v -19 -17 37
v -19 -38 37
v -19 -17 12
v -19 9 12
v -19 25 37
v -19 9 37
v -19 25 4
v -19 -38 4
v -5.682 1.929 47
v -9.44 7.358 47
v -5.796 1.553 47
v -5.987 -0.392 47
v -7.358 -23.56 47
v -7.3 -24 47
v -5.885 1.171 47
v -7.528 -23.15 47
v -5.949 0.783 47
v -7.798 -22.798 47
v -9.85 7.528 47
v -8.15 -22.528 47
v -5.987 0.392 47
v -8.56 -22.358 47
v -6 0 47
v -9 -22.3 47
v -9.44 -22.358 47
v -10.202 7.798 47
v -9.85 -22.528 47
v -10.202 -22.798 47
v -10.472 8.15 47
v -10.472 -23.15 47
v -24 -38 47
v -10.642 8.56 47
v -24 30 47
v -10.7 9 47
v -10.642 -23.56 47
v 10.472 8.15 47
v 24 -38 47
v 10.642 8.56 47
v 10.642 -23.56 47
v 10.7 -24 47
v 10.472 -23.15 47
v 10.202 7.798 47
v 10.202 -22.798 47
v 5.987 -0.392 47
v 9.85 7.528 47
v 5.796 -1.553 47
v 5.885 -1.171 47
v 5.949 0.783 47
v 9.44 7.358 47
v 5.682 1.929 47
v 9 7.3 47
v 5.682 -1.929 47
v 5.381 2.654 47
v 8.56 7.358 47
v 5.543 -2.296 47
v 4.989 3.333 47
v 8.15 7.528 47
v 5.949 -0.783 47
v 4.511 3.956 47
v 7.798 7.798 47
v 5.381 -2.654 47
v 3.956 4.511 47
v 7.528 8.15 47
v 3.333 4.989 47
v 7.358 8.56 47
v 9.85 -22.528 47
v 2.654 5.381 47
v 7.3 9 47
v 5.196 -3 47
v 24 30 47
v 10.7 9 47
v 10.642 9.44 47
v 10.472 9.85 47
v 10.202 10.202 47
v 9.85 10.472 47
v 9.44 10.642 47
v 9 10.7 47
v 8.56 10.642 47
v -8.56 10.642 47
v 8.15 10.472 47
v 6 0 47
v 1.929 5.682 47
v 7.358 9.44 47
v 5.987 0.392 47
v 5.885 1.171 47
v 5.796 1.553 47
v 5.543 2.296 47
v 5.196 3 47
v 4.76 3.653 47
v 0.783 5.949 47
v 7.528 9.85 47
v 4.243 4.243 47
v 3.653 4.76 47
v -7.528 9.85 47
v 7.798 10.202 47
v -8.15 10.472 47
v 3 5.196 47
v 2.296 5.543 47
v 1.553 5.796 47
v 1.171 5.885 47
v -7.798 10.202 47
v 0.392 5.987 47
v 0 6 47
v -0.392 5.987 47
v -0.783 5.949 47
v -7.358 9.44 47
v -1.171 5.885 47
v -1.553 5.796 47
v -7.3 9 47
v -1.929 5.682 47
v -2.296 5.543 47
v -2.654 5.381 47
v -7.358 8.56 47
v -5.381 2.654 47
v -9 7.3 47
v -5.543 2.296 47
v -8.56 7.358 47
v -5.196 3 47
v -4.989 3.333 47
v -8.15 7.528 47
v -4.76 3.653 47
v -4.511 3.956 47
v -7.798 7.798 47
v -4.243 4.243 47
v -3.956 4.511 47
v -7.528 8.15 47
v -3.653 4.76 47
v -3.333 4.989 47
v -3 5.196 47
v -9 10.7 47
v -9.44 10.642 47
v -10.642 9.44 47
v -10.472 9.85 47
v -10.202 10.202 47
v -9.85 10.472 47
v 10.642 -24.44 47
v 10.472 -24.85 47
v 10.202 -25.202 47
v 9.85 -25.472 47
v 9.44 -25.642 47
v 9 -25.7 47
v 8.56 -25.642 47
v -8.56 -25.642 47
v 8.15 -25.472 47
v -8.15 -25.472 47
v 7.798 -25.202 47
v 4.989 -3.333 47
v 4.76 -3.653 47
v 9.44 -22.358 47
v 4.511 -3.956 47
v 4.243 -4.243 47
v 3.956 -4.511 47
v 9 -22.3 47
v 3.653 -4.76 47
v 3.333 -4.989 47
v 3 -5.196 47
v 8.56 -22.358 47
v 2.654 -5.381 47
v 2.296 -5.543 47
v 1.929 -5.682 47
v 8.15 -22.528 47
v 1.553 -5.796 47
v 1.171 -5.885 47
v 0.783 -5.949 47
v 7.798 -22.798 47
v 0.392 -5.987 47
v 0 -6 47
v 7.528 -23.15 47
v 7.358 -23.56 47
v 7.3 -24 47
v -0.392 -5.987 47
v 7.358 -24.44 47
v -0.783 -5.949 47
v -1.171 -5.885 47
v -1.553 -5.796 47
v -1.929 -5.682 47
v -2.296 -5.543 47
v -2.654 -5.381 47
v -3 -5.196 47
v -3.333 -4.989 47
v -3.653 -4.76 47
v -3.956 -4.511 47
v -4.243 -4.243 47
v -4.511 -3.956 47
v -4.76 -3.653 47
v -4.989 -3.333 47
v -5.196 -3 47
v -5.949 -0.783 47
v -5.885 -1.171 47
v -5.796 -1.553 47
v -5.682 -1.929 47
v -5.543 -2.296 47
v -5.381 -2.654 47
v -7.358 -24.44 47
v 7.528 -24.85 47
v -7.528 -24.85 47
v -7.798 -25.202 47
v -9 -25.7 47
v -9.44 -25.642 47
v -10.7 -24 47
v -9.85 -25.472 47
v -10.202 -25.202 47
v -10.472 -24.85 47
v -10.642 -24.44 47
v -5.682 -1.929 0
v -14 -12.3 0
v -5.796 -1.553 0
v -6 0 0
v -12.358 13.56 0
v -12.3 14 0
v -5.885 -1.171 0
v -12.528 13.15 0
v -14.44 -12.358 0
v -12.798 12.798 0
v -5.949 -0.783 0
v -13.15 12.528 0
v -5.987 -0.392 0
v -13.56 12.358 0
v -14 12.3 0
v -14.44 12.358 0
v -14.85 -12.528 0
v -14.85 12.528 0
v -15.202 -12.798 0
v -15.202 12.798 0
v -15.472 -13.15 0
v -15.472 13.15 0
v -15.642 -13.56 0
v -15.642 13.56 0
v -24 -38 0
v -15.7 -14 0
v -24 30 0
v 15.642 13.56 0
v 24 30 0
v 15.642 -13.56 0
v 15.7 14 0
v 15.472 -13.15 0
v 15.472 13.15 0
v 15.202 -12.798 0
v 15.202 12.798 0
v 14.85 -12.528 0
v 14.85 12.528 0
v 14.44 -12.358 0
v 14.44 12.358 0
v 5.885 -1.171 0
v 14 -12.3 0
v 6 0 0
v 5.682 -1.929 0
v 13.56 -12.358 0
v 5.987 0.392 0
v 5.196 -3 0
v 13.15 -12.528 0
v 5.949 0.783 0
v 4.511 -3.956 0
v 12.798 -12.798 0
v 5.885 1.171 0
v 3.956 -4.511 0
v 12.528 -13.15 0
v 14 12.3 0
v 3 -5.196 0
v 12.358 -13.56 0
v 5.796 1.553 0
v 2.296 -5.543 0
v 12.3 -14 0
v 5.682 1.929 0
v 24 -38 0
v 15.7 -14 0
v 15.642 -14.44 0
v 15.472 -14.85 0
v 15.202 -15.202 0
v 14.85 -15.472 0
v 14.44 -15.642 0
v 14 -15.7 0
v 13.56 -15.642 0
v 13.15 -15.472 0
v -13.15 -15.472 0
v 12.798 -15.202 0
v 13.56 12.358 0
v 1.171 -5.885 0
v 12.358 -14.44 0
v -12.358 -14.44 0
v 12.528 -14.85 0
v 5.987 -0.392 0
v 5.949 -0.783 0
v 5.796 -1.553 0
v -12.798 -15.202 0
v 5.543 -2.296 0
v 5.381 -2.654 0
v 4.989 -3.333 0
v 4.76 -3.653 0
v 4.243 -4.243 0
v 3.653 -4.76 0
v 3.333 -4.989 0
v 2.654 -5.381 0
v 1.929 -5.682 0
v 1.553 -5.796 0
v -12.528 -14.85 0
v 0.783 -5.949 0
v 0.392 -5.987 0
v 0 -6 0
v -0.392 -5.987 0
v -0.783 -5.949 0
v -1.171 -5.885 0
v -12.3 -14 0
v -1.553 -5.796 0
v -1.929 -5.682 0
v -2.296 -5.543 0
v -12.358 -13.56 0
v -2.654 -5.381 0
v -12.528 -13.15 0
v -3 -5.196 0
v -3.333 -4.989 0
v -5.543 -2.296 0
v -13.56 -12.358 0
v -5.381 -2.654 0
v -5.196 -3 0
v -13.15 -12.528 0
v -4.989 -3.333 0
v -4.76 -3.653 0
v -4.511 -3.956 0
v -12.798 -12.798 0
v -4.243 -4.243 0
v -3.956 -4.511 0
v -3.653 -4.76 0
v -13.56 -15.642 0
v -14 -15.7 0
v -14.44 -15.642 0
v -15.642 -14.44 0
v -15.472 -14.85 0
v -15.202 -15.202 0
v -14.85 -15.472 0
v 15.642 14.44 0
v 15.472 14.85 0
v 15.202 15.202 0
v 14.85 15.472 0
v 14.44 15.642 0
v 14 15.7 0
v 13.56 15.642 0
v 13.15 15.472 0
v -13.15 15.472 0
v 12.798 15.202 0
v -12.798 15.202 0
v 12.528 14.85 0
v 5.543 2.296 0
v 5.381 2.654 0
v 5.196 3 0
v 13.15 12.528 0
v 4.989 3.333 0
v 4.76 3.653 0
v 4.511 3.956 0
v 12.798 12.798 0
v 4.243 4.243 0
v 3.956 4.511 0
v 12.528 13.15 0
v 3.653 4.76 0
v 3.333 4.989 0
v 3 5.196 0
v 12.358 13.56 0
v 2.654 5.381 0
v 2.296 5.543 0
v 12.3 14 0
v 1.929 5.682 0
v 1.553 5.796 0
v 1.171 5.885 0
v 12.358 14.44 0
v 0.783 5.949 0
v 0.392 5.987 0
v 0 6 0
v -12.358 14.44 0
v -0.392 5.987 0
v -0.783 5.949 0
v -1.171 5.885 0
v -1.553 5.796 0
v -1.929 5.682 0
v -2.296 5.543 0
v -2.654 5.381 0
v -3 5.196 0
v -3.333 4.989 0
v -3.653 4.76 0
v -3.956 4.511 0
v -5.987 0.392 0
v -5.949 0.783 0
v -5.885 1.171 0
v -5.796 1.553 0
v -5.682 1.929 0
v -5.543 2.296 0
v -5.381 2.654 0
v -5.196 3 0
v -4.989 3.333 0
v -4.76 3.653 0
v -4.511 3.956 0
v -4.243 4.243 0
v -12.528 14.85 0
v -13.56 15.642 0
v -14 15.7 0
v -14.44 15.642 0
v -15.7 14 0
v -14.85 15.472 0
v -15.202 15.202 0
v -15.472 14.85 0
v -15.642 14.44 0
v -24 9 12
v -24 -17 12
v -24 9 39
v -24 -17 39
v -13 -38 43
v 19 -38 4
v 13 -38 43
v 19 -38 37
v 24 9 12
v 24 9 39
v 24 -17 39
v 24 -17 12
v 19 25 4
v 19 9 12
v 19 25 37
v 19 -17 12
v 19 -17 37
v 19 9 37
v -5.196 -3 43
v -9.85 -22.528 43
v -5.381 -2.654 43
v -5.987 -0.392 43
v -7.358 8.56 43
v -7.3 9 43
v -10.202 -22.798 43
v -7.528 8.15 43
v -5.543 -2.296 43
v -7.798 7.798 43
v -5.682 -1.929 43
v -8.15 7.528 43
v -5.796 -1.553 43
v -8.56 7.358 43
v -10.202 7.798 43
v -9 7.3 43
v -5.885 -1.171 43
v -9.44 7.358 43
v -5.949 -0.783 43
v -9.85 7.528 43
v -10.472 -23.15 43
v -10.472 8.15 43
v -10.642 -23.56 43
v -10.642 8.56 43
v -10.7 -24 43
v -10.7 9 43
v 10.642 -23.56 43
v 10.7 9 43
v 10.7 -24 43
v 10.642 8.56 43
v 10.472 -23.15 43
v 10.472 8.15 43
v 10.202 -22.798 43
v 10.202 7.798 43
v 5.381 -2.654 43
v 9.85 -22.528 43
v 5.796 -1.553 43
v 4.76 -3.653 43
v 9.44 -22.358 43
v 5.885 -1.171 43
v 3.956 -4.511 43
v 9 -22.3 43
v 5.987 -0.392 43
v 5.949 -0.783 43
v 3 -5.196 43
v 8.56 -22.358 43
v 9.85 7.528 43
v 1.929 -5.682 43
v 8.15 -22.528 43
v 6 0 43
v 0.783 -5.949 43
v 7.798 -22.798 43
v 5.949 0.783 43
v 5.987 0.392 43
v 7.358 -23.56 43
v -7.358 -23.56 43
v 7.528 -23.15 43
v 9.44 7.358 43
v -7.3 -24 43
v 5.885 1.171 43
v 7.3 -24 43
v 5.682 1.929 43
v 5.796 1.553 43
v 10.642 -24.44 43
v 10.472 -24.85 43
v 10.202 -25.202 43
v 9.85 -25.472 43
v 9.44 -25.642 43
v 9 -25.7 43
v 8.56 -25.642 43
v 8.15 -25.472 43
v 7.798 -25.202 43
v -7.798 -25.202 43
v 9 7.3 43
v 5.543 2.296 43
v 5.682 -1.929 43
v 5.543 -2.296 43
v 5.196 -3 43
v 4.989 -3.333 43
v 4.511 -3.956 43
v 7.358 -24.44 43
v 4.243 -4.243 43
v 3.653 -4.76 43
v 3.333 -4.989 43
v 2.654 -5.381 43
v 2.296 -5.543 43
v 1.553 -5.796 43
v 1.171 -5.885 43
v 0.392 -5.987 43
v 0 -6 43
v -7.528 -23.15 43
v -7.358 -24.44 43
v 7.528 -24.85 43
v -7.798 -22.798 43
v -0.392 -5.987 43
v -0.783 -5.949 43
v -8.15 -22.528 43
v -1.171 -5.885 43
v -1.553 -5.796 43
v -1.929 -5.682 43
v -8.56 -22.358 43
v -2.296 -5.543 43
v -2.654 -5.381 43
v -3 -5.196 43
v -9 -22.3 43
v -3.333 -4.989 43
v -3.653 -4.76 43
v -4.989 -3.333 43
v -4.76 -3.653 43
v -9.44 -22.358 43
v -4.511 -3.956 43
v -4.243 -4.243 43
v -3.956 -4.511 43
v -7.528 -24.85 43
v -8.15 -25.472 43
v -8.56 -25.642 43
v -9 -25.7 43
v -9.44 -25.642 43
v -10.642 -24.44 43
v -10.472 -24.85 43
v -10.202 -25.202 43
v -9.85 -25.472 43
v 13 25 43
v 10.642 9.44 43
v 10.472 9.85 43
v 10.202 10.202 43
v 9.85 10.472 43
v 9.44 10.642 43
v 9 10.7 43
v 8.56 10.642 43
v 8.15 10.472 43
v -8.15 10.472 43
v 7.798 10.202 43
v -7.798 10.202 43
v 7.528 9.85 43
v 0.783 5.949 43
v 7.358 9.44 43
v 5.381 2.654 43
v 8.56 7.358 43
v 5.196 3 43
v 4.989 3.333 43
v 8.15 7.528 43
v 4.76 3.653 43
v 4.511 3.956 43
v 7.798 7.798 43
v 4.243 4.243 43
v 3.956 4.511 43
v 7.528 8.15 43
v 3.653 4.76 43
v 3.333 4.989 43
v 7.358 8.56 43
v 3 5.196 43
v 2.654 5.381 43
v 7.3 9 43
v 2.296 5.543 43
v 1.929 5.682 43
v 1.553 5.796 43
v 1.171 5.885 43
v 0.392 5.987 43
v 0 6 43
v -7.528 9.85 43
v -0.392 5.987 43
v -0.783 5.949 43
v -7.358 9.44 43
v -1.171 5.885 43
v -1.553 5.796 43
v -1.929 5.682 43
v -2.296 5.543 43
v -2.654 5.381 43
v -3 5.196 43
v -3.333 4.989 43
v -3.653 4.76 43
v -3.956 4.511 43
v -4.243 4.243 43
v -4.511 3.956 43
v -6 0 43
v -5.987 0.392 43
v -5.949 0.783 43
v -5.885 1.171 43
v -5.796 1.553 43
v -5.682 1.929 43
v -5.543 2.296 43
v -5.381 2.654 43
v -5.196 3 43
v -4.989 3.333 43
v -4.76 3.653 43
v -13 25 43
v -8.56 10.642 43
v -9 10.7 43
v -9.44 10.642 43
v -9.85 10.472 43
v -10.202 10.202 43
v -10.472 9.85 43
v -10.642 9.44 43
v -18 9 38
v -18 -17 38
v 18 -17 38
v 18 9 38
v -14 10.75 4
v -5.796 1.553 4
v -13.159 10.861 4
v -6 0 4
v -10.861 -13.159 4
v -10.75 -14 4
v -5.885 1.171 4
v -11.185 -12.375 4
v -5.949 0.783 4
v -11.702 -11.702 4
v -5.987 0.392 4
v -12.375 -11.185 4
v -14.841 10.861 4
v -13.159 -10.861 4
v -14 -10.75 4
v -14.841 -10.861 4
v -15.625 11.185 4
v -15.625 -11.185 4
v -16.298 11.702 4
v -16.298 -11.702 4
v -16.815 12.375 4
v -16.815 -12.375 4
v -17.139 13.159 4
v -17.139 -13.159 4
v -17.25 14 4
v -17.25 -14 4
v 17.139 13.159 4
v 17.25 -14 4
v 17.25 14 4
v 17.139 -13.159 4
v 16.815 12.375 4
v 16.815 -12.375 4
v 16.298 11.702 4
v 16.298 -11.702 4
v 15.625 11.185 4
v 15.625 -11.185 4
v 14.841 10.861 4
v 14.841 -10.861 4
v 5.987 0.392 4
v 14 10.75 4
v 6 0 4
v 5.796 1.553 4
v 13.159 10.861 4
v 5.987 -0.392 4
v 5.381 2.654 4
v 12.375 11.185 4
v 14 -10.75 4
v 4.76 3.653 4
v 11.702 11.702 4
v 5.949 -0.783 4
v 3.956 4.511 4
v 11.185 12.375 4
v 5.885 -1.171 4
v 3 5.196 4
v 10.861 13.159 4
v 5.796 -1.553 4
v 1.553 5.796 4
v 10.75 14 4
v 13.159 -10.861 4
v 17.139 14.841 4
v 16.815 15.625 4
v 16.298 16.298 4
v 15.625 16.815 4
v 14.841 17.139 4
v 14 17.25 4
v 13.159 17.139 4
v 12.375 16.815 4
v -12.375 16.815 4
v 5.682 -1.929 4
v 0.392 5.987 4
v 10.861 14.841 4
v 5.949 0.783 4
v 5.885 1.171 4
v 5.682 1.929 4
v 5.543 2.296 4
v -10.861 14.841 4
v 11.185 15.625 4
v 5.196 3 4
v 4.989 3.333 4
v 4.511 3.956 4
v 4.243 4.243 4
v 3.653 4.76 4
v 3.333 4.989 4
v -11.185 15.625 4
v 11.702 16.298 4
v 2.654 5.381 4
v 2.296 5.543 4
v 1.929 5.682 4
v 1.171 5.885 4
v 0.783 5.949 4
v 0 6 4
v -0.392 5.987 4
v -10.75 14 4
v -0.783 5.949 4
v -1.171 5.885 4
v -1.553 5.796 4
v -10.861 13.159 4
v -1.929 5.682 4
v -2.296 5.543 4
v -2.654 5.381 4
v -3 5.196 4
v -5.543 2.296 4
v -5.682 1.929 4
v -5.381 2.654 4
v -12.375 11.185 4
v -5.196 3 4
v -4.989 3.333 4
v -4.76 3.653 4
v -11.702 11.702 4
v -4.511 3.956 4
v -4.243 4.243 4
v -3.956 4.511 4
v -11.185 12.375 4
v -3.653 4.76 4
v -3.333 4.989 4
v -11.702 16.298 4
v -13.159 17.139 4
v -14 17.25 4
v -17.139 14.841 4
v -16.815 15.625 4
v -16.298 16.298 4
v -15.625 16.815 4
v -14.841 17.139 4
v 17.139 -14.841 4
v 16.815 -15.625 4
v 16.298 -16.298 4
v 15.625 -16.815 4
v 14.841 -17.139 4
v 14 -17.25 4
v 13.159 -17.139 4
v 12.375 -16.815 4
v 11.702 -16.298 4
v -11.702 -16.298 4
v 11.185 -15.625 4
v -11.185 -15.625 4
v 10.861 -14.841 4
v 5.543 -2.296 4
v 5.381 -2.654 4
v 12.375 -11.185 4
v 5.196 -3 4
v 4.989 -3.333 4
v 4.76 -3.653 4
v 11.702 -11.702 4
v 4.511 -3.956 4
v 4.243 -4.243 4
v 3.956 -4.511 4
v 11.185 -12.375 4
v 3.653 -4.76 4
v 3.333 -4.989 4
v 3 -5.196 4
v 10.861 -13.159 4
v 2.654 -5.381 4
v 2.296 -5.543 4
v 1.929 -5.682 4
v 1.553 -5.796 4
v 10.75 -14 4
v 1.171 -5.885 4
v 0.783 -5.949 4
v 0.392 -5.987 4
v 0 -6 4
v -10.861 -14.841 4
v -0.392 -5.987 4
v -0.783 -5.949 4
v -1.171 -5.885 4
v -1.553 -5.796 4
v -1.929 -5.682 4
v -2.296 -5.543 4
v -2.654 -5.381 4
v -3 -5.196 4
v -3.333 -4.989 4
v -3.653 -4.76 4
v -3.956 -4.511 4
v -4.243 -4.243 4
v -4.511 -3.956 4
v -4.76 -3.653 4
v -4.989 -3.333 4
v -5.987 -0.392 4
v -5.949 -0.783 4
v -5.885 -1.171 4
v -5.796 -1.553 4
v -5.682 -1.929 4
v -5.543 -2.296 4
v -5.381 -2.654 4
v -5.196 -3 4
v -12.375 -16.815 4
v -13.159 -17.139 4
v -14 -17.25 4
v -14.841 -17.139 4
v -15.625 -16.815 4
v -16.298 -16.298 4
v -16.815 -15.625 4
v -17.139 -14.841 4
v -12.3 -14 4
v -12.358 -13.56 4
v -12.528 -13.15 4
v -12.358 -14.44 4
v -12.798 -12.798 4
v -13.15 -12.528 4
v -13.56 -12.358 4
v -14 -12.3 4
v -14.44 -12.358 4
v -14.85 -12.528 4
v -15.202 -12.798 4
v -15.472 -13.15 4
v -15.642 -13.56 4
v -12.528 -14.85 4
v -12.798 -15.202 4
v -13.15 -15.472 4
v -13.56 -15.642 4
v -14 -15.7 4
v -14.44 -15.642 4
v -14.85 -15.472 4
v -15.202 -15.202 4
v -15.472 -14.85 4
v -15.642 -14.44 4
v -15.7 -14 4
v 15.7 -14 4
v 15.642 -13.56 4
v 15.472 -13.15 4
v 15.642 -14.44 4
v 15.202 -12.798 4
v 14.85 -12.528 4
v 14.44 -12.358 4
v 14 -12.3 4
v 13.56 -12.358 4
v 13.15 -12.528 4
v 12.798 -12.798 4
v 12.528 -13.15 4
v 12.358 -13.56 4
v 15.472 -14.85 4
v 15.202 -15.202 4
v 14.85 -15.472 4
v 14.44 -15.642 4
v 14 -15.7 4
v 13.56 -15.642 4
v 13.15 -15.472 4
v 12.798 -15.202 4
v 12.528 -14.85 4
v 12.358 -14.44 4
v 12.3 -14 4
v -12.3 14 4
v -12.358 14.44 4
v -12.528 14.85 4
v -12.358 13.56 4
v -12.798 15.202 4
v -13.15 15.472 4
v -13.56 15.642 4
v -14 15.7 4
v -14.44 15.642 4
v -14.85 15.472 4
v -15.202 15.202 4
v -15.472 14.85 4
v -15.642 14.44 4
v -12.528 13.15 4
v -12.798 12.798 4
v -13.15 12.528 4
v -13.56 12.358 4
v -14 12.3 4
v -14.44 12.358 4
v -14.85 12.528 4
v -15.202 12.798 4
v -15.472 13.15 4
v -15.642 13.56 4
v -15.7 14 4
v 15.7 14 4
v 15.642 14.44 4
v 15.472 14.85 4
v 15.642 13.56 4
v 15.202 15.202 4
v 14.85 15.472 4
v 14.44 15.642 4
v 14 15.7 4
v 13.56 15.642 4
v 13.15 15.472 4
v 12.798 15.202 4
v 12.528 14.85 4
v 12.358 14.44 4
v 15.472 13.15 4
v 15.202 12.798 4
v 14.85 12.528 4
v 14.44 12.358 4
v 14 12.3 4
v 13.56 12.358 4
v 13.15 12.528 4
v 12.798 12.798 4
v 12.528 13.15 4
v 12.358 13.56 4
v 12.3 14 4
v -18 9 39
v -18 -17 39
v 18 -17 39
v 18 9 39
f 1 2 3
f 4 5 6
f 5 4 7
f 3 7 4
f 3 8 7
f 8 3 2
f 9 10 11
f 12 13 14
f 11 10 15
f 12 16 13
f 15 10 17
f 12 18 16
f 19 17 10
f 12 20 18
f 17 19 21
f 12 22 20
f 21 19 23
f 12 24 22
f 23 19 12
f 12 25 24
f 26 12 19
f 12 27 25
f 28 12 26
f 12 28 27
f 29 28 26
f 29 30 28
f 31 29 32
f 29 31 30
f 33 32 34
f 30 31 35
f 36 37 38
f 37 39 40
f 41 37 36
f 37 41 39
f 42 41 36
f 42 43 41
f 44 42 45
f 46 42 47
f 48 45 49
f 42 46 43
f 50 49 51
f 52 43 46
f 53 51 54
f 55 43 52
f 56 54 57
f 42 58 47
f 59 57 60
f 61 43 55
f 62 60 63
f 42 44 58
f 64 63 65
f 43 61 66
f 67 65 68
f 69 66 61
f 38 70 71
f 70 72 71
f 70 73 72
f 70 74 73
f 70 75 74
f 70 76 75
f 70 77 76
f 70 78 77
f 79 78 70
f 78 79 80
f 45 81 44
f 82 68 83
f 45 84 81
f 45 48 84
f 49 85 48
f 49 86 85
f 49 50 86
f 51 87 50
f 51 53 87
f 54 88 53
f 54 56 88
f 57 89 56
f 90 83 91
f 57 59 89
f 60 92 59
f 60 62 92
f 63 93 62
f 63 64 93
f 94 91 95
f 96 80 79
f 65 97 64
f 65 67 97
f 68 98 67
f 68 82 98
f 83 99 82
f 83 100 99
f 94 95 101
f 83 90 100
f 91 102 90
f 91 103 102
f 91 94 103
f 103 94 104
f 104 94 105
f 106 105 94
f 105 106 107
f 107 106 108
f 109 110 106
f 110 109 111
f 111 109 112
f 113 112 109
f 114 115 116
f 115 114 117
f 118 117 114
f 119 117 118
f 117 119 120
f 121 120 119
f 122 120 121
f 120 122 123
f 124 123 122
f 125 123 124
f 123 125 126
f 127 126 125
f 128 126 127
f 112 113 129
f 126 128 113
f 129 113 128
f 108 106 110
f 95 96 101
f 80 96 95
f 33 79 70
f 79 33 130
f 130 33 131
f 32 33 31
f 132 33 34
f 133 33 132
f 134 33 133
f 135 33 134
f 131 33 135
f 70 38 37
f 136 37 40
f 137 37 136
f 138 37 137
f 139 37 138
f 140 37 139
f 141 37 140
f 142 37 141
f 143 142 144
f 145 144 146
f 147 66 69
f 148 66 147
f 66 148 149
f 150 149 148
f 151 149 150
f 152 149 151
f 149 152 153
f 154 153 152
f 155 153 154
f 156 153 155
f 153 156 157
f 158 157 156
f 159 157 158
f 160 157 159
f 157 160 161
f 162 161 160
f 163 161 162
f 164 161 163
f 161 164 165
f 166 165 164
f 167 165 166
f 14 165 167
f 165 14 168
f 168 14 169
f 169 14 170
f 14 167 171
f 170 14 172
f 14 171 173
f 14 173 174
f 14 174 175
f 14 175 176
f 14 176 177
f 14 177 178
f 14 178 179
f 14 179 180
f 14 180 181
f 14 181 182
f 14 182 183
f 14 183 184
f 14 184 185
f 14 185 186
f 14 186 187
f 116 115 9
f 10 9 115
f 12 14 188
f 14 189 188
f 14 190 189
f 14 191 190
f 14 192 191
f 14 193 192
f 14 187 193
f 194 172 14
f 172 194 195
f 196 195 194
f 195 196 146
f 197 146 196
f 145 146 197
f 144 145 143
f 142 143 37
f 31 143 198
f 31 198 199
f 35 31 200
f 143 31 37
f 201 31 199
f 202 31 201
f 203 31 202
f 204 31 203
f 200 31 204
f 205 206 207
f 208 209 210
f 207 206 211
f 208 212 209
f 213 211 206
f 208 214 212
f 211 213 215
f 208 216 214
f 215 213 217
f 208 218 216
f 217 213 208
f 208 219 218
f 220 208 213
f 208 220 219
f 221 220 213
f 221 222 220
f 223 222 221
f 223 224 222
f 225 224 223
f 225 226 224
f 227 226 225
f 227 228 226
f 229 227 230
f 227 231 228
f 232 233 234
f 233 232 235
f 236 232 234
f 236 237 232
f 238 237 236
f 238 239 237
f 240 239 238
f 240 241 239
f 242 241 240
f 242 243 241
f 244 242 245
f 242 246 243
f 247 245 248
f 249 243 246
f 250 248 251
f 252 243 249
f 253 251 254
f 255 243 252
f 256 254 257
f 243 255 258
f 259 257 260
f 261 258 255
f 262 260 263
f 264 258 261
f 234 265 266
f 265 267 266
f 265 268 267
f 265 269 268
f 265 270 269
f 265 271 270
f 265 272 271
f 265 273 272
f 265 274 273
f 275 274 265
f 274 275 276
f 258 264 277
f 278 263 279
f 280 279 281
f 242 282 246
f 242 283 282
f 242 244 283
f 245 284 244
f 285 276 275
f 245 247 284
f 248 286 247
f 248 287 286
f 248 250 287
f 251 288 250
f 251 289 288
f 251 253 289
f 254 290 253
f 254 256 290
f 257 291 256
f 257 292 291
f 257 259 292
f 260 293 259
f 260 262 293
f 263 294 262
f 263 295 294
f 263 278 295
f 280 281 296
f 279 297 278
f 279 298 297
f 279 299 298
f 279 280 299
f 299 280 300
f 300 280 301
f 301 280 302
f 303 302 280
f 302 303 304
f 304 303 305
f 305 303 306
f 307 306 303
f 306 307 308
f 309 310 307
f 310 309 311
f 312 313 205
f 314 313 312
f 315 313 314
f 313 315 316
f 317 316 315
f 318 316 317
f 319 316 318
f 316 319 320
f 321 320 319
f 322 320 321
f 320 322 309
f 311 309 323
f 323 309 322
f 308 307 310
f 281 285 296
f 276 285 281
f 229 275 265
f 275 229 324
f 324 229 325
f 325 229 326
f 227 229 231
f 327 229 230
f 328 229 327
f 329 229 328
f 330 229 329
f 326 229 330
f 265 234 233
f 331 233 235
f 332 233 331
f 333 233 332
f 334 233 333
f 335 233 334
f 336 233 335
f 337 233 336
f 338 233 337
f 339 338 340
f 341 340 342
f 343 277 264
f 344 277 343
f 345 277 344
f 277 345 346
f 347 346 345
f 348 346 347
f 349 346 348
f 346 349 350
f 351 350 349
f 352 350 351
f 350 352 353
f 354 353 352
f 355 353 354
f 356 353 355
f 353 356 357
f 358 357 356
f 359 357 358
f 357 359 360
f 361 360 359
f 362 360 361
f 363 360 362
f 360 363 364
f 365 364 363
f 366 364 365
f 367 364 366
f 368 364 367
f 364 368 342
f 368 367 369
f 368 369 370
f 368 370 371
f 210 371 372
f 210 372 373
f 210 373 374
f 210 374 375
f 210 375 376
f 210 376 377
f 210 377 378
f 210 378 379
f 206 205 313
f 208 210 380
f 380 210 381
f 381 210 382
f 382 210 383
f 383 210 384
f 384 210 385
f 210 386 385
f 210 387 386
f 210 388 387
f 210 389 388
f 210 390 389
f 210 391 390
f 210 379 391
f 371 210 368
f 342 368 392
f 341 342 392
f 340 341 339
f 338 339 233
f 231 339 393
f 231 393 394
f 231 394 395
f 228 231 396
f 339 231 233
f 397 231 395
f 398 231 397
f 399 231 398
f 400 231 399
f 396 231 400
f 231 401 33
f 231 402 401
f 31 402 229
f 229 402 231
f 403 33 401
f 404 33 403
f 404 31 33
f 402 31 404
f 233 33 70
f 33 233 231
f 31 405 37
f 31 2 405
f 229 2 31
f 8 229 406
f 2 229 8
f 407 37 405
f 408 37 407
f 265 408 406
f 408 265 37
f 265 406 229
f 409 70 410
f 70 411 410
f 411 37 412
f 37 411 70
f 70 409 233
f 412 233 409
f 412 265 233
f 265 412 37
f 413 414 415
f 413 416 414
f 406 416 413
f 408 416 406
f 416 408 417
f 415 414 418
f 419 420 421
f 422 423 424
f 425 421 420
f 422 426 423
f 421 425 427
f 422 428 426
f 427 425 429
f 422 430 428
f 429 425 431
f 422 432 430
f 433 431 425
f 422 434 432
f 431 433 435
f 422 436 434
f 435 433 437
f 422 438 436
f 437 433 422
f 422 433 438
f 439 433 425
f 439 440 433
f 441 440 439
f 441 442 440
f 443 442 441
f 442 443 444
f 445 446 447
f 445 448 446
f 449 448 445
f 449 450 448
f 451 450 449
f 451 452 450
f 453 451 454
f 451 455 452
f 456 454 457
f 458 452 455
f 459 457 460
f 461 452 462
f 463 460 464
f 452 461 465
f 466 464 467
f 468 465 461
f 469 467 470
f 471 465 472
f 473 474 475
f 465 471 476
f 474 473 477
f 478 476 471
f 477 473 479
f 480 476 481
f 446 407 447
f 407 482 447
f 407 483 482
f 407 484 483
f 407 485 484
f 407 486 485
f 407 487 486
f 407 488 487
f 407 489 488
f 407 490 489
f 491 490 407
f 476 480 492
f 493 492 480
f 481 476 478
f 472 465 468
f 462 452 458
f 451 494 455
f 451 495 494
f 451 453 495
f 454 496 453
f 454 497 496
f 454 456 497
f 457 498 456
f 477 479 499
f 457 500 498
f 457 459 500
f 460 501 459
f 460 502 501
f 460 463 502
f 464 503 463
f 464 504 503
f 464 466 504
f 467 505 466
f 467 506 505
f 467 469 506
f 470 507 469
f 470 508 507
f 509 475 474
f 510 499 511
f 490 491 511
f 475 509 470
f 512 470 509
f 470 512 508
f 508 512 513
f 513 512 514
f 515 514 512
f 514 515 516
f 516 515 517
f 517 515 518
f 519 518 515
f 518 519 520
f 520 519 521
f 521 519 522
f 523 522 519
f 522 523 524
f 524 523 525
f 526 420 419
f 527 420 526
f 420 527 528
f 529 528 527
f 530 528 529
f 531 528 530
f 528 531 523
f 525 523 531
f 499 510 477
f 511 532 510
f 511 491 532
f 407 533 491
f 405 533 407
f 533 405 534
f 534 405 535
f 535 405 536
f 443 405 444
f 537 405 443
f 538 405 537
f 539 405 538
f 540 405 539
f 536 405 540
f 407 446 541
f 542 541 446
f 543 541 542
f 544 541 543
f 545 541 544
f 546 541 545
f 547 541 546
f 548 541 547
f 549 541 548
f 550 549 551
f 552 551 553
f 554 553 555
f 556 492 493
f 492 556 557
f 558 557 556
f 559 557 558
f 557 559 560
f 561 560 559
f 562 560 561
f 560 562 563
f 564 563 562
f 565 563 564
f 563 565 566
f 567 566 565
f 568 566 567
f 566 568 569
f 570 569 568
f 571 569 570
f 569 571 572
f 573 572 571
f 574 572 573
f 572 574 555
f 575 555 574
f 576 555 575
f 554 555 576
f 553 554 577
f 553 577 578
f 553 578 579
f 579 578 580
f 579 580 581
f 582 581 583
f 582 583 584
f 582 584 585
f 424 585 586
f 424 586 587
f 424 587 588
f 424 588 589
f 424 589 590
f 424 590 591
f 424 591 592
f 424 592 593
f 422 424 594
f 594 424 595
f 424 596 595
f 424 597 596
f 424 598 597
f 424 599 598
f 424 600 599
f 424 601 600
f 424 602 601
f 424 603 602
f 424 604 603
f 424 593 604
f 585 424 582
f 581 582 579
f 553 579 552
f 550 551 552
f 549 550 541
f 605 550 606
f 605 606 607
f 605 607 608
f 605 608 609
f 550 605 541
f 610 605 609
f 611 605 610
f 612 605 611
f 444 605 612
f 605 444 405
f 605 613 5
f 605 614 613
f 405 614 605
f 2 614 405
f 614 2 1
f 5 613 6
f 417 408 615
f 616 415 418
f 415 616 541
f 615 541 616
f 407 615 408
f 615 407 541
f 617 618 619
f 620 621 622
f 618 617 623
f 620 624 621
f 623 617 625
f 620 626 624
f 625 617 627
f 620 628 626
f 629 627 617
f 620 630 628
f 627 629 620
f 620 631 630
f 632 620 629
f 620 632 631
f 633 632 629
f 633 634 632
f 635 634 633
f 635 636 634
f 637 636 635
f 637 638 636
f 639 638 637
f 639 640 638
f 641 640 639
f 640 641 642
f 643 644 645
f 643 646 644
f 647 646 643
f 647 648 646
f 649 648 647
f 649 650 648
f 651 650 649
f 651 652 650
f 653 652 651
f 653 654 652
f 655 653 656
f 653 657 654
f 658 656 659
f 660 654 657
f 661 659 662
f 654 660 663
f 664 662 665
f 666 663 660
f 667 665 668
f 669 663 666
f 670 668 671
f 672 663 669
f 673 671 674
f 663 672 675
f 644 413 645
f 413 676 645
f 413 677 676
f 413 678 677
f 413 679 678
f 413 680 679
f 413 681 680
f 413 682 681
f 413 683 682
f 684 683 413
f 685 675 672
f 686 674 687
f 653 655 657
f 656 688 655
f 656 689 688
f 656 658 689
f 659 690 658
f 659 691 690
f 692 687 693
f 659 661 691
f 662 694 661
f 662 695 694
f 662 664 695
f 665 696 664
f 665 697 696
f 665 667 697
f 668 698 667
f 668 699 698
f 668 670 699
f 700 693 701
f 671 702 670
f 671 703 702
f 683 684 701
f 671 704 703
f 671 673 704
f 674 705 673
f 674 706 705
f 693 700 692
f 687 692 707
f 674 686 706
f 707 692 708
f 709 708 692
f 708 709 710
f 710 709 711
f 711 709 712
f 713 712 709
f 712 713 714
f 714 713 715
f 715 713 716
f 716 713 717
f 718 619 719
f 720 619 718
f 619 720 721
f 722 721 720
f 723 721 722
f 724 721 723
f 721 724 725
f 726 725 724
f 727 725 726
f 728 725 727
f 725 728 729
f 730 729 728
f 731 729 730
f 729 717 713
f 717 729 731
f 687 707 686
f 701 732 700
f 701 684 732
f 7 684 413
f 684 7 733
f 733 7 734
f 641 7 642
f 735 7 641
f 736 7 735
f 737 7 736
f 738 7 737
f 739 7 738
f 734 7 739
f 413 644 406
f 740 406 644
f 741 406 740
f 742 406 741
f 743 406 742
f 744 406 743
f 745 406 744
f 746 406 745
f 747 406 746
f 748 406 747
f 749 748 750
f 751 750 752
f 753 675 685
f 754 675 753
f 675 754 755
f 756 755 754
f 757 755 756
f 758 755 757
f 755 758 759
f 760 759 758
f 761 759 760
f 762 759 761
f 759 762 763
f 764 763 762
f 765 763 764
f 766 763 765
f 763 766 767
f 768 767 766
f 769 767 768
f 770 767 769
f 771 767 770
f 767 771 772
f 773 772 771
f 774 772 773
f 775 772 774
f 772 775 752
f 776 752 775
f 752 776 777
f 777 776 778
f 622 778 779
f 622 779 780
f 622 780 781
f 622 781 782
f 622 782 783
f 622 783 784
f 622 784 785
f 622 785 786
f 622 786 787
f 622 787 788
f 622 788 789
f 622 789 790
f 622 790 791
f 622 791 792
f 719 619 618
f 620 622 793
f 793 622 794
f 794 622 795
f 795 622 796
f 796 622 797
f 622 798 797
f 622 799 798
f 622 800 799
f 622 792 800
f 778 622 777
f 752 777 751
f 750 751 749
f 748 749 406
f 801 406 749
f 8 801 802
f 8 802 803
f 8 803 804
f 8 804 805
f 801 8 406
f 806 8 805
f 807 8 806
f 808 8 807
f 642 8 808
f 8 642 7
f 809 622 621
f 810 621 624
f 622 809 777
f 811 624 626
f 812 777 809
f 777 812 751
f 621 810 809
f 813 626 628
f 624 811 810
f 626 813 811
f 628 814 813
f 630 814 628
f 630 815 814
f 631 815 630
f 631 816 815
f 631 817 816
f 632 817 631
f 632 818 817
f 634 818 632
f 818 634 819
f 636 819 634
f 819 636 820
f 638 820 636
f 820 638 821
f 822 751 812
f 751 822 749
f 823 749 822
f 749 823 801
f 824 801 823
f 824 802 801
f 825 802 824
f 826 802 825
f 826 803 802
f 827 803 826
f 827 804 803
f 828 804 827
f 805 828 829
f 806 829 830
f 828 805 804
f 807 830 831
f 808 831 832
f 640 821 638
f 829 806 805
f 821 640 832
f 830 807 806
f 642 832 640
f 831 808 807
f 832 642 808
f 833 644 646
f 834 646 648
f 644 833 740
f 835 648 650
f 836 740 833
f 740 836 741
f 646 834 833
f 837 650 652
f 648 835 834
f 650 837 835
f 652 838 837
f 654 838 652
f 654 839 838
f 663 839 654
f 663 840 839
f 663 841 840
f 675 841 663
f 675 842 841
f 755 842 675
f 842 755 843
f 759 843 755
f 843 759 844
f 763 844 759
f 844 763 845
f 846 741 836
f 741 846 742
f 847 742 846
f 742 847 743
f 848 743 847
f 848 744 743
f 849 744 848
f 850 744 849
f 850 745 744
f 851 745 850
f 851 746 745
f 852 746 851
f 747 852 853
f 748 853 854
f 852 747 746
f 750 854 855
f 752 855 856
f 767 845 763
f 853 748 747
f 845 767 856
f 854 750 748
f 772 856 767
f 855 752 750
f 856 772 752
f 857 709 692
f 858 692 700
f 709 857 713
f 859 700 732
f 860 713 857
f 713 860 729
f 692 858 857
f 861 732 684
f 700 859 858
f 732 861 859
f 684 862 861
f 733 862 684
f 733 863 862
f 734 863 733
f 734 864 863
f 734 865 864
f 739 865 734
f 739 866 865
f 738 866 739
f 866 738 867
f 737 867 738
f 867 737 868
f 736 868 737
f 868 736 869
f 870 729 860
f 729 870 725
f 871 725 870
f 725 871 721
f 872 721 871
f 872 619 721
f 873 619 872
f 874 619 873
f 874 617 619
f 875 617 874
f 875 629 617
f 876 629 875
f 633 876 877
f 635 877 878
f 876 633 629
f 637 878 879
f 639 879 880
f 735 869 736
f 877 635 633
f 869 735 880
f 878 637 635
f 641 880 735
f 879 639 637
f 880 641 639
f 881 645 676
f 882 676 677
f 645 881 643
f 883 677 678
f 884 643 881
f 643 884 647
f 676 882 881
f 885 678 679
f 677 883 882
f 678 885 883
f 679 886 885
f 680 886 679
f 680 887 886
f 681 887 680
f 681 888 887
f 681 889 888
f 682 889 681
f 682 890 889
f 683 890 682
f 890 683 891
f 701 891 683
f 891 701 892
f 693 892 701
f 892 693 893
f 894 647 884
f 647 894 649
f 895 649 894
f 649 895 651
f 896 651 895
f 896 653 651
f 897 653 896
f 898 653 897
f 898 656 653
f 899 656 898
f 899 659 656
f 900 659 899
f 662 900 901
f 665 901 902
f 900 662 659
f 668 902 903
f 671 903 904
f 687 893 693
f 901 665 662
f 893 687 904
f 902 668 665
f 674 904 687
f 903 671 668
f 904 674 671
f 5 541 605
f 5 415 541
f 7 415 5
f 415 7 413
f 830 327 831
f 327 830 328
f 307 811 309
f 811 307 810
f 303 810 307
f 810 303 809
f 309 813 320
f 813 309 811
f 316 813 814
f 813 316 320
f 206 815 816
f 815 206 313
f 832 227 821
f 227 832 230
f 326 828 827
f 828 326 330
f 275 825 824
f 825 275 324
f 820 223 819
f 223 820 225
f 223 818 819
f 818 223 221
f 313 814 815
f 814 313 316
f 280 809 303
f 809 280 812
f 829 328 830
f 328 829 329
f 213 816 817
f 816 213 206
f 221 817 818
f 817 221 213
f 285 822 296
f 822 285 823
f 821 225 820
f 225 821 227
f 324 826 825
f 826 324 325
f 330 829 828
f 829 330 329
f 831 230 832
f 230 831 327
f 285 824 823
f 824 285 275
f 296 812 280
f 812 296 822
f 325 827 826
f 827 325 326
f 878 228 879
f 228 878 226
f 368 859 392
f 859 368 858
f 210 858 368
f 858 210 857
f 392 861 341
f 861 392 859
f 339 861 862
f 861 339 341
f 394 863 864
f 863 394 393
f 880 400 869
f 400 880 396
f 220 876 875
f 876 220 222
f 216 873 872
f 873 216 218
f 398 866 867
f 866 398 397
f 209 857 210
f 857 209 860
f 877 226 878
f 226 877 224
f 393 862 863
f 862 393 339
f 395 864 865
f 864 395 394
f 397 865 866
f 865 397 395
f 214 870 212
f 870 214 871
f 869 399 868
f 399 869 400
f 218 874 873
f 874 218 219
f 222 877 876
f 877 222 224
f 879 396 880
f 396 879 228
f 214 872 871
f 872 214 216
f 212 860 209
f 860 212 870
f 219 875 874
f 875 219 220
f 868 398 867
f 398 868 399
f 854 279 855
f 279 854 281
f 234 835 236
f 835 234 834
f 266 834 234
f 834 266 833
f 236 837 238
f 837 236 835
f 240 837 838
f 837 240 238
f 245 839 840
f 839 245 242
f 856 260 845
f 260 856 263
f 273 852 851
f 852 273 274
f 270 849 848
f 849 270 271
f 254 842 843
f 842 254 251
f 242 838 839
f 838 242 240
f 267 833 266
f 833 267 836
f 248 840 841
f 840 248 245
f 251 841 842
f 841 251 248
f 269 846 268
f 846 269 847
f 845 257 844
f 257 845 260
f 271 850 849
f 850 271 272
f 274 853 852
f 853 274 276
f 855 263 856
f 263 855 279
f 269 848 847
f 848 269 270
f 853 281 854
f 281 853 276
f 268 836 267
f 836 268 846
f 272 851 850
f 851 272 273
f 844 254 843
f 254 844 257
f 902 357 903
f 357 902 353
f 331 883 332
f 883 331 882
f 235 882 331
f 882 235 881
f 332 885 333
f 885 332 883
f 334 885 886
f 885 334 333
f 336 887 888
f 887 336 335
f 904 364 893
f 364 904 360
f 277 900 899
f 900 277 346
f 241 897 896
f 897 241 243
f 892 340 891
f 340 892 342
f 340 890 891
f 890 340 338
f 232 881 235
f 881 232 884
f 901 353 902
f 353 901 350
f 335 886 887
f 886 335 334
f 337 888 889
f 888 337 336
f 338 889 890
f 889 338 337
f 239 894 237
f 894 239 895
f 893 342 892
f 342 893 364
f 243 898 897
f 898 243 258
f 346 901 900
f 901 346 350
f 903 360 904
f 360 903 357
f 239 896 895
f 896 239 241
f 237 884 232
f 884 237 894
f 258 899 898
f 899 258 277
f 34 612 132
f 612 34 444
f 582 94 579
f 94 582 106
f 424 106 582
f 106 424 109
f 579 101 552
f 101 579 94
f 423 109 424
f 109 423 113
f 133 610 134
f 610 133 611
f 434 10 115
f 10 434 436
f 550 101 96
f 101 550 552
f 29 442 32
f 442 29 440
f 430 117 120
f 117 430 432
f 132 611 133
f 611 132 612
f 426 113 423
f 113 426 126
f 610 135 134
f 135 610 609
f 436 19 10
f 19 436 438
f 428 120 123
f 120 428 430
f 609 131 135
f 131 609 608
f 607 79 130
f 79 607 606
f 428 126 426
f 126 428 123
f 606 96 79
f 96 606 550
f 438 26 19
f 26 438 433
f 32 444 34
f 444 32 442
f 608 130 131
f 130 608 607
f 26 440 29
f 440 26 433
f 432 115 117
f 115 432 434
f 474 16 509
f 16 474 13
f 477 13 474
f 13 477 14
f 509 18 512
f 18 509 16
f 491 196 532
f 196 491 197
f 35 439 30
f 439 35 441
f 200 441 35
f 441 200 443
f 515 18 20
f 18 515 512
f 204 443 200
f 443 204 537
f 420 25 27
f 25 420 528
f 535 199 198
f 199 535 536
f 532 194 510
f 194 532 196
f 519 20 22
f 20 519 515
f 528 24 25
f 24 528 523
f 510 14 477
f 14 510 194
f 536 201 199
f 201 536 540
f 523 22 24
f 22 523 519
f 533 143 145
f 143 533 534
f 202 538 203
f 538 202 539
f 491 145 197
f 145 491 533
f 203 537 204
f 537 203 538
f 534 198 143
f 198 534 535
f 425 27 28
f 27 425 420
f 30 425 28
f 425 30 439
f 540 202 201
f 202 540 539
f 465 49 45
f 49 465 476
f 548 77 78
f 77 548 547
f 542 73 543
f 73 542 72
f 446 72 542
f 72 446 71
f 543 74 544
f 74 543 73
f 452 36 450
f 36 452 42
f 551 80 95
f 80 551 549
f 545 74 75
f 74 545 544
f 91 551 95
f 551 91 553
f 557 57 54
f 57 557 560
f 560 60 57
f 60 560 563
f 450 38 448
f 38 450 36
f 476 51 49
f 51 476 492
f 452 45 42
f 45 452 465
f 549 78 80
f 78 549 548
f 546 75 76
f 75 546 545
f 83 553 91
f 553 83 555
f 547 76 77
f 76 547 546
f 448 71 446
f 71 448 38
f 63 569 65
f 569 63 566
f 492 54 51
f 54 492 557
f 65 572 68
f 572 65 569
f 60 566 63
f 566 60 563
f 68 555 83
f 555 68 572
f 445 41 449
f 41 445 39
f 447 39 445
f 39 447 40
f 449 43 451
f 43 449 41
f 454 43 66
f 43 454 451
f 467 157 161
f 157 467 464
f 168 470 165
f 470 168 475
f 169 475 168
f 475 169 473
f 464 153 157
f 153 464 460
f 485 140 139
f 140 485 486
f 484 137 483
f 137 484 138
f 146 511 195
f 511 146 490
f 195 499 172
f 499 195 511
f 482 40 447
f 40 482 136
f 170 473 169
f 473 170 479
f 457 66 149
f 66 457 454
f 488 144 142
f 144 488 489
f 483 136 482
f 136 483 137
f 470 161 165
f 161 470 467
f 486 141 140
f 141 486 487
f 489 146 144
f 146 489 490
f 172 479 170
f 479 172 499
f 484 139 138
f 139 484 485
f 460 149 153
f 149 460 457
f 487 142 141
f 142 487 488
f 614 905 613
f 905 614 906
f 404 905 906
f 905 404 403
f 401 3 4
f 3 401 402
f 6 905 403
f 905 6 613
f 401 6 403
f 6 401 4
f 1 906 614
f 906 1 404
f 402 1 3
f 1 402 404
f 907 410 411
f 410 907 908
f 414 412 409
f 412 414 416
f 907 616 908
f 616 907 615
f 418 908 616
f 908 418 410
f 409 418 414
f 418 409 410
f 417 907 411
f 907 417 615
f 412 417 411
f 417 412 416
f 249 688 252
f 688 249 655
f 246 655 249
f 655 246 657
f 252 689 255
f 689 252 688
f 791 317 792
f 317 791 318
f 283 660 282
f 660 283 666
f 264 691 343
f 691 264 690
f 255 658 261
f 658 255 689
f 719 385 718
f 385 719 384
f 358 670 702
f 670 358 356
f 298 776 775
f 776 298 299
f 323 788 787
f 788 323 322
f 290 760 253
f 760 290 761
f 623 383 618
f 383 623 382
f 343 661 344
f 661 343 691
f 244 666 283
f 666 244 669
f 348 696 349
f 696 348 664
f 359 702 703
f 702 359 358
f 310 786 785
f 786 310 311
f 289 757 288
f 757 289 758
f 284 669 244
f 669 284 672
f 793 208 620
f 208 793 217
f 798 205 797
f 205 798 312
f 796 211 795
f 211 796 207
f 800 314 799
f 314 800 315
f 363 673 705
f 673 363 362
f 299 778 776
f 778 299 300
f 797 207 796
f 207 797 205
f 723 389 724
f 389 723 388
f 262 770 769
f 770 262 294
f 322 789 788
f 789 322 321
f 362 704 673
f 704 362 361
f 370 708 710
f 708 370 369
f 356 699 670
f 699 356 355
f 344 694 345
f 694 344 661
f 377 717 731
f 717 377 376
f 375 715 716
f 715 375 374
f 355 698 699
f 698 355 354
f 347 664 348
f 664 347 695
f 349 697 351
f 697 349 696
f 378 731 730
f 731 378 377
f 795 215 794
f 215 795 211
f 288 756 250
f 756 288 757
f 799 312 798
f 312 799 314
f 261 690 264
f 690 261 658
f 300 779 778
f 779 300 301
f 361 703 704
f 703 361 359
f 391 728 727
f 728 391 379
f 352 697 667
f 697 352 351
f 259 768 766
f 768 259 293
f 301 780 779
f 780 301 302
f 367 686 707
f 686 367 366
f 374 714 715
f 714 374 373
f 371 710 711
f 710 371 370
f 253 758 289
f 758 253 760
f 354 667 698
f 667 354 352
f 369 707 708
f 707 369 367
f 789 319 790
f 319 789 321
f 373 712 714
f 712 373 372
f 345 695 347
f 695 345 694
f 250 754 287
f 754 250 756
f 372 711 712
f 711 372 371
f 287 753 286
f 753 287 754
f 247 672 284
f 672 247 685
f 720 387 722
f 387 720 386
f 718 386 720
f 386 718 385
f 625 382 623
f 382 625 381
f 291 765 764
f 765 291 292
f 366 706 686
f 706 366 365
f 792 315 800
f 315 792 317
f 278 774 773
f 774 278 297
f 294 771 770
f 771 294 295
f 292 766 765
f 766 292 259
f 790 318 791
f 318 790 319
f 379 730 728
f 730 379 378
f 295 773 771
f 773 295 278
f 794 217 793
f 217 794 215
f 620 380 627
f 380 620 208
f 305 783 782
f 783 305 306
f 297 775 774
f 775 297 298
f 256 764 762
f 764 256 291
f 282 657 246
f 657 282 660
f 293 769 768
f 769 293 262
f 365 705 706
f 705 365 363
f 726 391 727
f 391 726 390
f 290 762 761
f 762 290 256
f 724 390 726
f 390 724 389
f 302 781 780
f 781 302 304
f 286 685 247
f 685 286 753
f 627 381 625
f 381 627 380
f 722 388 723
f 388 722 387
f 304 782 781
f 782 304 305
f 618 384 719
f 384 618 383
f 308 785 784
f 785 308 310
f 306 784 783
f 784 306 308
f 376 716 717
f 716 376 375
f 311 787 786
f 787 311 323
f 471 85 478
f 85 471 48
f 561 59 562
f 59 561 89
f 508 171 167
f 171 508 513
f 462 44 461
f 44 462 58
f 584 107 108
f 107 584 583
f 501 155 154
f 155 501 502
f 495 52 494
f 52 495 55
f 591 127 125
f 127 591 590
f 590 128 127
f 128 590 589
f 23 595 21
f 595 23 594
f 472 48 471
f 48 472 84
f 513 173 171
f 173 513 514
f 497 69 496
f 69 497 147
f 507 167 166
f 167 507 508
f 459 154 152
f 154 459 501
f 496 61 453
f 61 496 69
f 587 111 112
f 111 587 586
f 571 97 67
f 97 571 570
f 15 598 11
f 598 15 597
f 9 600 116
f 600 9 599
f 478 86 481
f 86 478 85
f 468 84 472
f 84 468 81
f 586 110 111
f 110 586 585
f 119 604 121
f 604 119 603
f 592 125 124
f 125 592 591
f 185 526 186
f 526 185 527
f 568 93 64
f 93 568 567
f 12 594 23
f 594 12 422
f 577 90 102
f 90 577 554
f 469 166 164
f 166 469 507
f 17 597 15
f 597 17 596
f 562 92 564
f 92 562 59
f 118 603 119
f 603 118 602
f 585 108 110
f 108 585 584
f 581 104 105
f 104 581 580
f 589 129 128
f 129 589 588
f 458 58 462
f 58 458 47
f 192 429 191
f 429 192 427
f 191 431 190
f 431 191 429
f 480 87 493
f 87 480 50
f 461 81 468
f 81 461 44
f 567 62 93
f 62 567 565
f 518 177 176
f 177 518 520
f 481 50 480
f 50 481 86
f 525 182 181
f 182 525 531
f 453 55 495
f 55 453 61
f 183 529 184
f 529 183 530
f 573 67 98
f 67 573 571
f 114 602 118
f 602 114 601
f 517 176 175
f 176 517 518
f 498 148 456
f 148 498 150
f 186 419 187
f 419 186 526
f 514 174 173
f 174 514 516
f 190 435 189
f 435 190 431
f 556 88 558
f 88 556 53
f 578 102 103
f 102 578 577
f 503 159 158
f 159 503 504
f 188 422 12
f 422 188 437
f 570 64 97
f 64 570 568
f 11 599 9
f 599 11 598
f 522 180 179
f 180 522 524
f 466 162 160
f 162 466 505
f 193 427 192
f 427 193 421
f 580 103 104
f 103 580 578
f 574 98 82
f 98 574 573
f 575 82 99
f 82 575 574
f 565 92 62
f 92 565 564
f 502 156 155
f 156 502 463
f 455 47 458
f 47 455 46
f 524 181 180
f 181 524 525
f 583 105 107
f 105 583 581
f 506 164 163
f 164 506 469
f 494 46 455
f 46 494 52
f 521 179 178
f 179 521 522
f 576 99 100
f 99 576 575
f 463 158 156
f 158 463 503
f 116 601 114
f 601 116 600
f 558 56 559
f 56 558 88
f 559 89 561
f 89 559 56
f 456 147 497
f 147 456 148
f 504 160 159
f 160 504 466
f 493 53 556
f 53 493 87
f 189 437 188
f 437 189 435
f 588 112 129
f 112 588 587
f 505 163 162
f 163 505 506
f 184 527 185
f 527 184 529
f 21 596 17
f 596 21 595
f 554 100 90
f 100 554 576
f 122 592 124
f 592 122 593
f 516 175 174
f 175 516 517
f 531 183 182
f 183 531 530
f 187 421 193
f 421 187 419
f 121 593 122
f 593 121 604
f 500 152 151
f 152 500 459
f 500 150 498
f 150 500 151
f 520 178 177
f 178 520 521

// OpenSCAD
// ferris/motor_mount.scad (v7, 2026-09-03 — automatic rotation)
// Parts for the JGY-370 worm-gear motor drive that replaces the hand crank.
//   PART="bracket" : U-box bracket. Tower plate (4 x M3 into the tower-upper-motor
//                    pilots) + 2 side walls + top wall + motor flange (4 x M3 into
//                    the gearbox's threaded holes). Open at the bottom: the 370 can
//                    hangs down there and a hex key reaches the flange screws.
//                    The coupling lives inside the box -> pinch guard for free.
//   PART="coupler" : printed rigid coupler Ø8 (wheel shaft) <-> Ø6 D (motor),
//                    fallback for the aluminium flexible coupling.
//   PART="plate"   : 4 mm shim plate with the same pattern (fine-tune standoff).
// Coordinates (bracket): shaft axis = Z (print axis), z=0 = tower outer face.
//   X across the wheel, +Y = up (world Z). Motor can hangs toward -Y.

include <../params.scad>;

PART = "bracket";

zf = motor_standoff;                 // flange OUTER face (gearbox sits here)
inner_h = mb_top - mb_bottom;        // 58: box inner height (Y)

module box_shell() {
    // tower plate
    translate([-mb_outer_w/2, mb_bottom - mb_wall_t, 0])
        cube([mb_outer_w, inner_h + 2*mb_wall_t, mb_plate_t]);
    // side walls
    for (sx = [-1, 1])
        translate([sx > 0 ? mb_inner_w/2 : -mb_outer_w/2, mb_bottom - mb_wall_t, 0])
            cube([mb_wall_t, inner_h + 2*mb_wall_t, zf]);
    // top wall (closes the box above the coupling)
    translate([-mb_outer_w/2, mb_top, 0])
        cube([mb_outer_w, mb_wall_t, zf]);
    // motor flange
    translate([-mb_outer_w/2, mb_bottom - mb_wall_t, zf - mb_flange_t])
        cube([mb_outer_w, inner_h + 2*mb_wall_t, mb_flange_t]);
    // 45° chamfer strips under the flange along both walls -> shorter bridge
    for (sx = [-1, 1])
        translate([sx * mb_inner_w/2, mb_bottom - mb_wall_t, zf - mb_flange_t])
            rotate([-90, 0, 0])
                linear_extrude(inner_h + 2*mb_wall_t)
                    polygon([[0, 0], [-sx * 6, 0], [0, 6]]);
}

module box_cuts() {
    // shaft bore through the tower plate (coupling starts 4+ mm outside it)
    translate([0, 0, -1]) cylinder(d = mb_shaft_clear_d, h = mb_plate_t + 2);
    // 4 x M3 clearance + counterbore for the tower screws (heads inside the box)
    for (sx = [-1, 1], sy = [-1, 1])
        translate([sx * mb_tower_hole_x, sy * mb_tower_hole_z, -1]) {
            cylinder(d = m3_clear, h = mb_plate_t + 2, $fn = 24);
            translate([0, 0, mb_plate_t + 1]) cylinder(d = 6.5, h = 10, $fn = 24);
        }
    // motor boss / shaft through the flange
    translate([0, 0, zf - mb_flange_t - 1]) cylinder(d = mb_flange_bore_d, h = mb_flange_t + 2);
    // 4 x M3 through the flange into the gearbox (pattern 18 x 33, shaft 9 below the upper row)
    for (sx = [-1, 1])
        for (y = [motor_shaft_off - 6, motor_shaft_off - 6 - motor_hole_dz])   // +9 / -24
            translate([sx * motor_hole_dx/2, y, zf - mb_flange_t - 1])
                cylinder(d = motor_hole_d, h = mb_flange_t + 2, $fn = 24);
    // side windows: lighten + let a driver / the wires through
    for (sx = [-1, 1])
        translate([sx * (mb_inner_w/2 + mb_wall_t/2), (mb_top + mb_bottom)/2, zf/2 + 2])
            cube([mb_wall_t + 2, 26, zf - 2*mb_plate_t - 12], center = true);
}

module bracket() {
    difference() { box_shell(); box_cuts(); }
}

module coupler() {
    difference() {
        cylinder(d = pc_d, h = pc_len);
        // Ø8 side (bottom): blind round bore
        translate([0, 0, -1]) cylinder(d = pc_bore8, h = pc_depth + 1);
        // Ø6 D side (top): blind D bore
        translate([0, 0, pc_len - pc_depth])
            intersection() {
                cylinder(d = pc_bore6, h = pc_depth + 1);
                translate([-pc_bore6/2, -pc_bore6/2, 0])
                    cube([pc_bore6, pc_flat6, pc_depth + 1]);
            }
        // radial set-screw pilots (one per bore, 90° apart)
        translate([0, 0, pc_depth/2]) rotate([0, 90, 0]) cylinder(d = pc_set_d, h = pc_d, $fn = 20);
        translate([0, 0, pc_len - pc_depth/2]) rotate([-90, 0, 0]) cylinder(d = pc_set_d, h = pc_d, $fn = 20);
    }
}

module plate() {
    difference() {
        translate([-mb_outer_w/2, mb_bottom - mb_wall_t, 0])
            cube([mb_outer_w, inner_h + 2*mb_wall_t, 4]);
        translate([0, 0, -1]) cylinder(d = mb_flange_bore_d, h = 6);
        for (sx = [-1, 1])
            for (y = [motor_shaft_off - 6, motor_shaft_off - 6 - motor_hole_dz])
                translate([sx * motor_hole_dx/2, y, -1]) cylinder(d = motor_hole_d, h = 6, $fn = 24);
    }
}

if (PART == "bracket") bracket();
else if (PART == "coupler") coupler();
else if (PART == "plate") plate();
